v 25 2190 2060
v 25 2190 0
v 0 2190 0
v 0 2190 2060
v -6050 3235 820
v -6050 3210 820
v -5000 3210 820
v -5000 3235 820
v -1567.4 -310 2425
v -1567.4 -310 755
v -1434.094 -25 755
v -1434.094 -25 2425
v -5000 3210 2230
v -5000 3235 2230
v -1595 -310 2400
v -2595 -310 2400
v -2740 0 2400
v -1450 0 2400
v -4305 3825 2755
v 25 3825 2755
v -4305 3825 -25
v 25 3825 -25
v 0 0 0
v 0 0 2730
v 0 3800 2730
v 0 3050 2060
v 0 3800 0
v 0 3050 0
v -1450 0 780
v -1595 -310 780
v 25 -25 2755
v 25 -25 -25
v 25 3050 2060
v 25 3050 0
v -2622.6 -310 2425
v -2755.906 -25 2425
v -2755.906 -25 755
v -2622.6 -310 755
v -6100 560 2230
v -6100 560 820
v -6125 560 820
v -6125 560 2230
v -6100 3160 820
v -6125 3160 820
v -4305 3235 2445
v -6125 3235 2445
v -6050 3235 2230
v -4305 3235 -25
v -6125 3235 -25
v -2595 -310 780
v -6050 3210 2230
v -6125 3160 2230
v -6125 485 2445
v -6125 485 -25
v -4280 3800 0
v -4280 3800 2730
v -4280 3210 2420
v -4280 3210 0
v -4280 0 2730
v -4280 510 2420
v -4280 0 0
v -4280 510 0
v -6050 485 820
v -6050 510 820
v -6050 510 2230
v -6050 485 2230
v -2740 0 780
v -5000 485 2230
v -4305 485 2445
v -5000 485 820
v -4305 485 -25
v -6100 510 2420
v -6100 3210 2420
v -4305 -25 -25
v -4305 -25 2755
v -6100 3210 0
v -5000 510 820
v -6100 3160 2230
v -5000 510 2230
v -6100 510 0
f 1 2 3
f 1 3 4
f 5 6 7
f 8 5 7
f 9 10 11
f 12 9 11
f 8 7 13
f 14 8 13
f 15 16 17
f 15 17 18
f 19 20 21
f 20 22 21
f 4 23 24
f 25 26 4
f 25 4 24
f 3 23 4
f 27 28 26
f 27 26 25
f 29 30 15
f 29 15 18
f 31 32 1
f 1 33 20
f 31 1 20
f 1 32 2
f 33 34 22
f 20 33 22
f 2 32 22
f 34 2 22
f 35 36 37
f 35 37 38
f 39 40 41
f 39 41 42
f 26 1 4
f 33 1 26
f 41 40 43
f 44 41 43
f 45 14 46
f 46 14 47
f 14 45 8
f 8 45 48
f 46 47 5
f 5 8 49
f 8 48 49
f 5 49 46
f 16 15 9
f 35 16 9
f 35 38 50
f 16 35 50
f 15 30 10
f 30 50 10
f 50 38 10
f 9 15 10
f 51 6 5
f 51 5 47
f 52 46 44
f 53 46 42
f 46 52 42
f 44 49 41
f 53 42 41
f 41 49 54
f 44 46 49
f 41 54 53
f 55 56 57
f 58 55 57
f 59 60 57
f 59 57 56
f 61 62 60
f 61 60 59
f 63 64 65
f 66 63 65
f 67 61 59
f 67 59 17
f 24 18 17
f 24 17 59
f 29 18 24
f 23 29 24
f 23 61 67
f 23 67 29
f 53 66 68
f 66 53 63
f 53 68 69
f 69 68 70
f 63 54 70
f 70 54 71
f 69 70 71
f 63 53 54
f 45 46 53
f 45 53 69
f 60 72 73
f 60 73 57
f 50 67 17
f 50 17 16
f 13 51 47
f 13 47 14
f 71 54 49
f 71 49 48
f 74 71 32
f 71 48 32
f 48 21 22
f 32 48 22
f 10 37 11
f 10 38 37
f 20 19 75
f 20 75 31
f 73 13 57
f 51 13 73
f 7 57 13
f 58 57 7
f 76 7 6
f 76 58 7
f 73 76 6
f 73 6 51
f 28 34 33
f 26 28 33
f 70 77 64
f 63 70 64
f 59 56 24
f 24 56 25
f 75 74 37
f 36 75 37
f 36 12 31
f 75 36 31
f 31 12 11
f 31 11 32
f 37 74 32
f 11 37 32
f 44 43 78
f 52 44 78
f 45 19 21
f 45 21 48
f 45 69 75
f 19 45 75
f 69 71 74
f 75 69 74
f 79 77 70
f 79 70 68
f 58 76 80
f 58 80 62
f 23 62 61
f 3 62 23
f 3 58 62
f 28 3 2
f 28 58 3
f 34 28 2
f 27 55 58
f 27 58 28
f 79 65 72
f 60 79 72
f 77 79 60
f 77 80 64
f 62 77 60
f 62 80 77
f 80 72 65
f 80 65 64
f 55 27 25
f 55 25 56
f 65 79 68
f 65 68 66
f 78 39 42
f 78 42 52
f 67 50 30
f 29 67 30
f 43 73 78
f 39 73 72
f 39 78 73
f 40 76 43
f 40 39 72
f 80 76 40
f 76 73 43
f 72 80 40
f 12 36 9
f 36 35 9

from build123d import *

# Parameters (mm, degrees)
F1_DEPTH  = 2730
F3_DEPTH  = 780
F6_DEPTH  = 330
F8_W      = 1820
F8_H      = 2700
F9_DEPTH  = 310
F10_T     = 25
F11_W     = 860
F11_H     = 2060
F12_DEPTH = 25
F13_W     = 2600
F13_H     = 1410
F14_DEPTH = 25
F15_W     = 1050
F15_H     = 1410
F16_DEPTH = 25
F17_W     = 1050
F17_H     = 1410
F18_DEPTH = 25


with BuildPart() as f1:
    # F0 (on Top) → F1 (new body)
    with BuildSketch(Plane.XY):
        Polygon((-1450, 0), (0, 0), (0, 3800), (-4280, 3800), (-4280, 3210), (-6100, 3210), (-6100, 510), (-4280, 510), (-4280, 0), (-2740, 0), (-2595, -310), (-1595, -310), align=None)
    extrude(amount=F1_DEPTH)

    # F2 (on face) → F3 (cut)
    with BuildSketch(Plane(origin=(0, 0, 0), x_dir=(1, 0, 0), z_dir=(0, 0, -1))):
        Polygon((-2595, 310), (-2740, 0), (-1450, 0), (-1595, 310), align=None)
    extrude(amount=-F3_DEPTH, mode=Mode.SUBTRACT)

    # F5 (on offset) → F6 (cut, through all)
    with BuildSketch(Plane(origin=(0, 0, 2400), x_dir=(1, 0, 0), z_dir=(0, 0, -1))):
        Polygon((-2595, 310), (-2740, 0), (-1450, 0), (-1595, 310), align=None)
    extrude(amount=-F6_DEPTH, mode=Mode.SUBTRACT)

    # F8 (on offset) → F9 (cut, through all)
    with BuildSketch(Plane(origin=(0, 0, 2420), x_dir=(1, 0, 0), z_dir=(0, 0, -1))):
        with Locations((-5190, -1860)):
            Rectangle(F8_W, F8_H)
    extrude(amount=-F9_DEPTH, mode=Mode.SUBTRACT)

    # F10
    f10_openings = [f1.faces().sort_by_distance(p)[0] for p in [
        (-2095, -310, 1590),
    ]]
    offset(amount=F10_T, openings=f10_openings, kind=Kind.INTERSECTION)

    # F11 (on face) → F12 (cut, through all)
    with BuildSketch(Plane.YZ.offset(25)):
        with Locations((2620, 1030)):
            Rectangle(F11_W, F11_H)
    extrude(amount=-F12_DEPTH, mode=Mode.SUBTRACT)

    # F13 (on face) → F14 (cut, through all)
    with BuildSketch(Plane.YZ.offset(-6100)):
        with Locations((1860, 1525)):
            Rectangle(F13_W, F13_H)
    extrude(amount=-F14_DEPTH, mode=Mode.SUBTRACT)

    # F15 (on face) → F16 (cut, through all)
    with BuildSketch(Plane.XZ.offset(-3210)):
        with Locations((-5525, 1525)):
            Rectangle(F15_W, F15_H)
    extrude(amount=-F16_DEPTH, mode=Mode.SUBTRACT)

    # F17 (on face) → F18 (cut, through all)
    with BuildSketch(Plane(origin=(0, 510, 0), x_dir=(-1, 0, 0), z_dir=(0, 1, 0))):
        with Locations((5525, 1525)):
            Rectangle(F17_W, F17_H)
    extrude(amount=-F18_DEPTH, mode=Mode.SUBTRACT)


solid = f1.part
